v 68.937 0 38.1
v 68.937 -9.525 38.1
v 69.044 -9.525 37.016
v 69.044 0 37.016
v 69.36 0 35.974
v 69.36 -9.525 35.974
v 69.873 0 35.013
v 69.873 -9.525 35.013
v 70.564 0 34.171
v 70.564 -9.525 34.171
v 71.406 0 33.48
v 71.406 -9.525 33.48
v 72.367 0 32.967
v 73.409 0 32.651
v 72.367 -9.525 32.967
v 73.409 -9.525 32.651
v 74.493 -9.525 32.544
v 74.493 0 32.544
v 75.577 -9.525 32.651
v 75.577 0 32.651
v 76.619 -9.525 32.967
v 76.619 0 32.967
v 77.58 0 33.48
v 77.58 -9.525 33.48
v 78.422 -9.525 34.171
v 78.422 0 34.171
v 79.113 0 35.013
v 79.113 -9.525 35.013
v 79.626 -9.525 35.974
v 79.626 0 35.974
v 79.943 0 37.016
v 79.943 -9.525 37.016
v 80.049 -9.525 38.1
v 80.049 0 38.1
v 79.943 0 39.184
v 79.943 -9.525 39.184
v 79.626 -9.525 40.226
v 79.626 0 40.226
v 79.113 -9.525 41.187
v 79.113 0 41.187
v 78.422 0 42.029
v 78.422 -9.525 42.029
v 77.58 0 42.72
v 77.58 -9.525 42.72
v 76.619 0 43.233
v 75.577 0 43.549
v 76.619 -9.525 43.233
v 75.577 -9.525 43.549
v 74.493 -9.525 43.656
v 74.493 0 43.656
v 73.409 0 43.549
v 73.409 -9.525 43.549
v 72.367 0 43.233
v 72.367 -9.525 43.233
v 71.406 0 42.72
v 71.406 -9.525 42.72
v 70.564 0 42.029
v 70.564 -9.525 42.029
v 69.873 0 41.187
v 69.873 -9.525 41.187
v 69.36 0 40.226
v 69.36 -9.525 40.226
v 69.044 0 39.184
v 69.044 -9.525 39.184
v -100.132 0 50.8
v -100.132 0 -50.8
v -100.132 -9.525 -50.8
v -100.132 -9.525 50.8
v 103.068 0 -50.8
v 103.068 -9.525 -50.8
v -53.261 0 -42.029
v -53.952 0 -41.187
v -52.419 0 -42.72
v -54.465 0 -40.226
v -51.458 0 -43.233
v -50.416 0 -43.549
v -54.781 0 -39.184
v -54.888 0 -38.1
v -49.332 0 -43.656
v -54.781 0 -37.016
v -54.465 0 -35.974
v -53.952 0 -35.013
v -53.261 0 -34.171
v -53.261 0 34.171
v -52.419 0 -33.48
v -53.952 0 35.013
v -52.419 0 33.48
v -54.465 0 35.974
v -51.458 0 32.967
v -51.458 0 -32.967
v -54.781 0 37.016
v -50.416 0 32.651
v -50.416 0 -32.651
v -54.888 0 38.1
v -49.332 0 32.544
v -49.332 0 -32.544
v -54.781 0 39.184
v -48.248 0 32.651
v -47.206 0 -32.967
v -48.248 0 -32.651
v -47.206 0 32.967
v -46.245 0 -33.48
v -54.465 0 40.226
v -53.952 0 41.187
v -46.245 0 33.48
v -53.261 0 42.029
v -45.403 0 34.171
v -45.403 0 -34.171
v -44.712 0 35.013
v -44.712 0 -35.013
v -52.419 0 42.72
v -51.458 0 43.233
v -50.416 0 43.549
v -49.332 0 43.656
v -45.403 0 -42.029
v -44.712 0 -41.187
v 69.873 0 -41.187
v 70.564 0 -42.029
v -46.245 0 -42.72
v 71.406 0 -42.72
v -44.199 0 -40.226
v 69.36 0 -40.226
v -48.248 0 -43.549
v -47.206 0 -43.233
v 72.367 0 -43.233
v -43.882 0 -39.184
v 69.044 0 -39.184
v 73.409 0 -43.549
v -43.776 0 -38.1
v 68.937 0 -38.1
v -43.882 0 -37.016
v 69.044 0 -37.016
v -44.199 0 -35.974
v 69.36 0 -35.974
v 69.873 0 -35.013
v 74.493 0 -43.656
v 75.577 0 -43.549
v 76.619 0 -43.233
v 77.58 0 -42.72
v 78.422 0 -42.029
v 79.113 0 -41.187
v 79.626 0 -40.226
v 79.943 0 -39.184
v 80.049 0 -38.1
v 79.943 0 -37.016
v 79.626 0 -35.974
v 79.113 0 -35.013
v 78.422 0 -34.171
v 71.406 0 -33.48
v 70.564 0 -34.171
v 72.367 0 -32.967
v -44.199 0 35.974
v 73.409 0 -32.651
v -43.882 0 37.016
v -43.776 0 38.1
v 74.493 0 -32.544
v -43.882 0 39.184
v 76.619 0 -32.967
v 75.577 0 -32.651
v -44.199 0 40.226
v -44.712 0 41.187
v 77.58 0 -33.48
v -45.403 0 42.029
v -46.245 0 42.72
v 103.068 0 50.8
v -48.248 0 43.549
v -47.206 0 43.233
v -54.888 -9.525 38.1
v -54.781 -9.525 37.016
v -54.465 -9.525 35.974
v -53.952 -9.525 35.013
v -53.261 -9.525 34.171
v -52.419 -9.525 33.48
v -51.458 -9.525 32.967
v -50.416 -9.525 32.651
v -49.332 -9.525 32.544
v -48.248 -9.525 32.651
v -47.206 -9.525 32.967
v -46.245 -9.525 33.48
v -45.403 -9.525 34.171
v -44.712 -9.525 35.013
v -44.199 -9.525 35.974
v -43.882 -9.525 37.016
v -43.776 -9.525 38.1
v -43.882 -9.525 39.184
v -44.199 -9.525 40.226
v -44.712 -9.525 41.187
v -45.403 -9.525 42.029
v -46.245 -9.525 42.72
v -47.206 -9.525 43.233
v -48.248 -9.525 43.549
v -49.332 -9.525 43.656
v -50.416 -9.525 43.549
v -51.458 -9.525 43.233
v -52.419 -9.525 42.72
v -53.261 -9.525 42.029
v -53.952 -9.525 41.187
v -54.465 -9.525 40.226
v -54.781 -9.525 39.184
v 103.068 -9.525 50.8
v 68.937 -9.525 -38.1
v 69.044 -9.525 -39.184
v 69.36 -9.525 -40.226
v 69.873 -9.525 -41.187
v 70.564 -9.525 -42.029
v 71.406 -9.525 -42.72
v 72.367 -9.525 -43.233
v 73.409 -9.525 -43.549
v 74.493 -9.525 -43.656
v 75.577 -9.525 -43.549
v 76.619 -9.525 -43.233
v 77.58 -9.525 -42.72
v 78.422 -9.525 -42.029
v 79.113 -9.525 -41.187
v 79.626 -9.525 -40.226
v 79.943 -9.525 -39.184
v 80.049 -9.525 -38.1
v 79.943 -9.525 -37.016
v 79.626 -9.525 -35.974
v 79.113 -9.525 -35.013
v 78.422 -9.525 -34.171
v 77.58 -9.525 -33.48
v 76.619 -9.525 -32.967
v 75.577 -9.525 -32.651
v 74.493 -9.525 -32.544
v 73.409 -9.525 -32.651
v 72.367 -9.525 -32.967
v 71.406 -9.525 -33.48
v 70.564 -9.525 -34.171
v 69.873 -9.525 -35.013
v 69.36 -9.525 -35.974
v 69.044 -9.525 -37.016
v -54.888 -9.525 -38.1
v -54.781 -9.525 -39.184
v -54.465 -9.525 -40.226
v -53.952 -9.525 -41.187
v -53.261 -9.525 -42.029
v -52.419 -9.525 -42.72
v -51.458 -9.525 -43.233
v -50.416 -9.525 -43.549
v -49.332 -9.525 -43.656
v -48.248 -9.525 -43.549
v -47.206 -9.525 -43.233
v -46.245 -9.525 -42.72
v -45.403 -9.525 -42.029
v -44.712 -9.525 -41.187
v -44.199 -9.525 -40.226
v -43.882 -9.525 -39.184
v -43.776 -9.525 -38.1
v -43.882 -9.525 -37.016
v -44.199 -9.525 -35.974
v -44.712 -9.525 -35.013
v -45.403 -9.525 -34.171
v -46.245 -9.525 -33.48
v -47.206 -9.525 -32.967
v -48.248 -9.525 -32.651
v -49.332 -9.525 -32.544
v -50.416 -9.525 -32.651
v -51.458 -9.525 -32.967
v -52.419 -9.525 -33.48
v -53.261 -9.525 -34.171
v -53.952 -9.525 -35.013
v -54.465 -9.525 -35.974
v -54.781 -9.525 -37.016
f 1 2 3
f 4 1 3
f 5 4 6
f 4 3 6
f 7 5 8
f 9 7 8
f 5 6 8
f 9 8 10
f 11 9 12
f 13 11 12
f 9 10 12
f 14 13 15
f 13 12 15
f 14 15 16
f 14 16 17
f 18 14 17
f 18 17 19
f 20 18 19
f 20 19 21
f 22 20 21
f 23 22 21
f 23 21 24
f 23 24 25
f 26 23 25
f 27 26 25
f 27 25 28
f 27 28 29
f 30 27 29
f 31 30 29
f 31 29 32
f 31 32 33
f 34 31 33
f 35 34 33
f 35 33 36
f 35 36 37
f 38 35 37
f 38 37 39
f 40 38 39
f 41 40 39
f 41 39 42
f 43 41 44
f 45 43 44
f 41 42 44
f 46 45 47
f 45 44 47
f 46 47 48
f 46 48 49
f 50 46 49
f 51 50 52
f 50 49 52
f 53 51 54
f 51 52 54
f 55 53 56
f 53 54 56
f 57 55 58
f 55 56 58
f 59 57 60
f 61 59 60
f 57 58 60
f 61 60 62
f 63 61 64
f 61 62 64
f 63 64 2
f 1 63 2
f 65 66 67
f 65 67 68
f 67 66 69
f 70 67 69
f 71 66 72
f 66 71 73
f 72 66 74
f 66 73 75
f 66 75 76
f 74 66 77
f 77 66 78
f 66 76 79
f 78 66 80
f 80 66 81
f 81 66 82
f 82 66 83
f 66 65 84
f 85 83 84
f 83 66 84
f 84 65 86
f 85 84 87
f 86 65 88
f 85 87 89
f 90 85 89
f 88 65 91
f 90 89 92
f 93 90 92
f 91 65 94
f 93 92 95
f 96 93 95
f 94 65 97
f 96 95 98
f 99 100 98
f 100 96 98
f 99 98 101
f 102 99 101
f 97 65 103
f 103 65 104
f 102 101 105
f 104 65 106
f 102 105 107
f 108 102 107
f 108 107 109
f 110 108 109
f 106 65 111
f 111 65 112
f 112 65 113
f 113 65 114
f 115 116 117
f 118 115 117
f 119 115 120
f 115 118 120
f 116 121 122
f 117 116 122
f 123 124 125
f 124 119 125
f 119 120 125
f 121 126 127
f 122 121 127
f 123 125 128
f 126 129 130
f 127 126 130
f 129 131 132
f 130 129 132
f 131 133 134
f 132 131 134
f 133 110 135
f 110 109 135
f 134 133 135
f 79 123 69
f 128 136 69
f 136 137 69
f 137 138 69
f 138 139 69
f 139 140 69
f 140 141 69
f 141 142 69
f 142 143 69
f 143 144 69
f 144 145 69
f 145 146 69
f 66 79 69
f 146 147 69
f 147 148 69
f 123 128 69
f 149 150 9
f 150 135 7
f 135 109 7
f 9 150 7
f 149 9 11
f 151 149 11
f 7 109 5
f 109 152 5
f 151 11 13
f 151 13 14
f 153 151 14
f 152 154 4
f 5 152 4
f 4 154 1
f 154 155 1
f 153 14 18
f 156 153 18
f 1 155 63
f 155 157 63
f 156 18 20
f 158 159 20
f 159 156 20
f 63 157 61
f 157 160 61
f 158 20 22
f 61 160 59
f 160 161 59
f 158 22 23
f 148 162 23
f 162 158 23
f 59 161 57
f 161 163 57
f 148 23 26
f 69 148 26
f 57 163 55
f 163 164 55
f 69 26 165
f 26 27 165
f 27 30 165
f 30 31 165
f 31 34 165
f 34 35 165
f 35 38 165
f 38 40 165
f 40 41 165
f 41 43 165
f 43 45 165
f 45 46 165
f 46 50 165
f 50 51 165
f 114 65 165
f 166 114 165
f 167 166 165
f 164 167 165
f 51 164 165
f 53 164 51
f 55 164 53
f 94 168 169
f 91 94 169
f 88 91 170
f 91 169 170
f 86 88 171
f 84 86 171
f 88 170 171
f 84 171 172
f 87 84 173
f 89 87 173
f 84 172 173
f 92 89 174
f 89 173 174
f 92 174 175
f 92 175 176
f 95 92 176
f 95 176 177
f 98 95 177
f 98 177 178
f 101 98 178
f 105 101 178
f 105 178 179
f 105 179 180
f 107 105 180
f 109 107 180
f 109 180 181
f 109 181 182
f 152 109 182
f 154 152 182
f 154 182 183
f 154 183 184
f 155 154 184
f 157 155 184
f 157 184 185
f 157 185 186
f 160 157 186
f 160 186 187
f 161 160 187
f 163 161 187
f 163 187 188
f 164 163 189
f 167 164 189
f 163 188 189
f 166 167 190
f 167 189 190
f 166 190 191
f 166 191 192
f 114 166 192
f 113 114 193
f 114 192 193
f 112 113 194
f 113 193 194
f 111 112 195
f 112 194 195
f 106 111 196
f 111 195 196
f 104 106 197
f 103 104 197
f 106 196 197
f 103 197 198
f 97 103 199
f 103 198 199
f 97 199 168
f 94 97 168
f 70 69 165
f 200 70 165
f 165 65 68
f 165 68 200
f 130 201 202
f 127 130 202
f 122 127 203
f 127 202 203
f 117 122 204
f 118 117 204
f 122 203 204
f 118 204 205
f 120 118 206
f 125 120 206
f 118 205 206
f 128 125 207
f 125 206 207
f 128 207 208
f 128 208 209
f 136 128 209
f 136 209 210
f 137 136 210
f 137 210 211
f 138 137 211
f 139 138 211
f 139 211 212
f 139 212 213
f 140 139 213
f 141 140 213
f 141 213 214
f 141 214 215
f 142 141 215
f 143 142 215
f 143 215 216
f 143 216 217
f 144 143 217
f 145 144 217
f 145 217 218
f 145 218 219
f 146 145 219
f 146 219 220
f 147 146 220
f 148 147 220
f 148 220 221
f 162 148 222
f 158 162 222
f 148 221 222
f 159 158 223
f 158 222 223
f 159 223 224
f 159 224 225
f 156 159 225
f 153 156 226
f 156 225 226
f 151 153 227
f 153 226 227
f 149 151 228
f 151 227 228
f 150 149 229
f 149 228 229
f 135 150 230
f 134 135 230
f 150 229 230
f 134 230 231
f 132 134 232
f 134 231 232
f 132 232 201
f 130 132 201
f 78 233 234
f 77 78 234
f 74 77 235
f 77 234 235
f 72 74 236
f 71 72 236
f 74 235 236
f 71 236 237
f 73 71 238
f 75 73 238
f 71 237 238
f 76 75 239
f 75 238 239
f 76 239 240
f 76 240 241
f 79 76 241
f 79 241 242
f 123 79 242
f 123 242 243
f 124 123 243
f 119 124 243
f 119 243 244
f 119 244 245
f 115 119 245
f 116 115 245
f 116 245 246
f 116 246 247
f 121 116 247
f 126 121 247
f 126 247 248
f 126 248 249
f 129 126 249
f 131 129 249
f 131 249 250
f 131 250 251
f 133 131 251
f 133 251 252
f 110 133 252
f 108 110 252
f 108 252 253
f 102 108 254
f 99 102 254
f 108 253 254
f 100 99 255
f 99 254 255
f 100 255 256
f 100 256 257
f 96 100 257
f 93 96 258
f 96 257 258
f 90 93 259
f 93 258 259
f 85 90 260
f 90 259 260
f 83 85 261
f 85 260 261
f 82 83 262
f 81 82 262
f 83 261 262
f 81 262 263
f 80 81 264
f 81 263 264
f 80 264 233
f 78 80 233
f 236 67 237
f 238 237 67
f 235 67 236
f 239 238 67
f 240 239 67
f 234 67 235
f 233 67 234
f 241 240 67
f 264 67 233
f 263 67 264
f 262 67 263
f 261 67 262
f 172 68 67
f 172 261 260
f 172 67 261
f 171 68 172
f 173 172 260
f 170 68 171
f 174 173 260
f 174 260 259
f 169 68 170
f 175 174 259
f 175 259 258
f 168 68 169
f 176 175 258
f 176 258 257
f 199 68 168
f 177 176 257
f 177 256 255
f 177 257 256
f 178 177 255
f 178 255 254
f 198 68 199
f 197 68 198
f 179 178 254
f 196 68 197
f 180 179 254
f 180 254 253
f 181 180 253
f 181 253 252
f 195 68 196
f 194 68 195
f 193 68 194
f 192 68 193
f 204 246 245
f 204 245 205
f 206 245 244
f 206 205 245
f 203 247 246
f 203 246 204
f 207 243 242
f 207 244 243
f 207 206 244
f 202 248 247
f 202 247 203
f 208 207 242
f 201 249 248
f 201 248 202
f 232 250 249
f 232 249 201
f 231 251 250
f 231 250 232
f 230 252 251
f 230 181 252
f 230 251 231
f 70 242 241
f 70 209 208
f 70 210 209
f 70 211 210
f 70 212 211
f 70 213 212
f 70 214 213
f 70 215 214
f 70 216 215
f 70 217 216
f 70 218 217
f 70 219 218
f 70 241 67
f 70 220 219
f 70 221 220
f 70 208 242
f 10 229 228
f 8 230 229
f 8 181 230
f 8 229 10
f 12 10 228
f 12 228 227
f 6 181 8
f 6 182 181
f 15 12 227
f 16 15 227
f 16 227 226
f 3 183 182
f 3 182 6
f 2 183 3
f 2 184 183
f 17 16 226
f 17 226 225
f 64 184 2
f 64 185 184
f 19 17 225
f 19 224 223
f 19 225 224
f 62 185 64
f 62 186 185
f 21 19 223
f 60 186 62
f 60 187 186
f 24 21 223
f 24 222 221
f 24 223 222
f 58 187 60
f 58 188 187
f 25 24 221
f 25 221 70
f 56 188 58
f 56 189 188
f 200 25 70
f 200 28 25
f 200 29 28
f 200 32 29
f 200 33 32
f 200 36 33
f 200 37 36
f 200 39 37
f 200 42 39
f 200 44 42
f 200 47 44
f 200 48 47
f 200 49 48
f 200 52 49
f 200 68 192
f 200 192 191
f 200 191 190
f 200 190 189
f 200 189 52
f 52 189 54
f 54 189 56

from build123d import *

# Parameters (mm, degrees)
F0_W     = 203.2
F0_H     = 101.6
F1_DEPTH = 9.525
F2_D     = 11.1125
F2_DEPTH = 19.05
F2_TIP   = 3.3385318145


# Not quite as in the source:
# - a length typed as a fraction of an inch, garbled in the dataset ("3 / 203.2 mm" for 3/8 in), is restored


with BuildPart() as f1:
    # F0 (on Front) → F1 (new body)
    with BuildSketch(Plane.XZ):
        with Locations((1.4680749737, 0)):
            Rectangle(F0_W, F0_H)
    extrude(amount=F1_DEPTH)

    # F2
    with Locations(Plane(origin=(0, 0, 0), x_dir=(1, 0, 0), z_dir=(0, 1, 0))):
        with Locations((74.4930749737, -38.1), (-49.3319250263, 38.1), (-49.3319250263, -38.1), (74.4930749737, 38.1)):
            Hole(F2_D / 2, depth=F2_DEPTH)
            with Locations((0, 0, -(F2_DEPTH + F2_TIP / 2))):  # 118° drill point
                Cone(0, F2_D / 2, F2_TIP, mode=Mode.SUBTRACT)


solid = f1.part
